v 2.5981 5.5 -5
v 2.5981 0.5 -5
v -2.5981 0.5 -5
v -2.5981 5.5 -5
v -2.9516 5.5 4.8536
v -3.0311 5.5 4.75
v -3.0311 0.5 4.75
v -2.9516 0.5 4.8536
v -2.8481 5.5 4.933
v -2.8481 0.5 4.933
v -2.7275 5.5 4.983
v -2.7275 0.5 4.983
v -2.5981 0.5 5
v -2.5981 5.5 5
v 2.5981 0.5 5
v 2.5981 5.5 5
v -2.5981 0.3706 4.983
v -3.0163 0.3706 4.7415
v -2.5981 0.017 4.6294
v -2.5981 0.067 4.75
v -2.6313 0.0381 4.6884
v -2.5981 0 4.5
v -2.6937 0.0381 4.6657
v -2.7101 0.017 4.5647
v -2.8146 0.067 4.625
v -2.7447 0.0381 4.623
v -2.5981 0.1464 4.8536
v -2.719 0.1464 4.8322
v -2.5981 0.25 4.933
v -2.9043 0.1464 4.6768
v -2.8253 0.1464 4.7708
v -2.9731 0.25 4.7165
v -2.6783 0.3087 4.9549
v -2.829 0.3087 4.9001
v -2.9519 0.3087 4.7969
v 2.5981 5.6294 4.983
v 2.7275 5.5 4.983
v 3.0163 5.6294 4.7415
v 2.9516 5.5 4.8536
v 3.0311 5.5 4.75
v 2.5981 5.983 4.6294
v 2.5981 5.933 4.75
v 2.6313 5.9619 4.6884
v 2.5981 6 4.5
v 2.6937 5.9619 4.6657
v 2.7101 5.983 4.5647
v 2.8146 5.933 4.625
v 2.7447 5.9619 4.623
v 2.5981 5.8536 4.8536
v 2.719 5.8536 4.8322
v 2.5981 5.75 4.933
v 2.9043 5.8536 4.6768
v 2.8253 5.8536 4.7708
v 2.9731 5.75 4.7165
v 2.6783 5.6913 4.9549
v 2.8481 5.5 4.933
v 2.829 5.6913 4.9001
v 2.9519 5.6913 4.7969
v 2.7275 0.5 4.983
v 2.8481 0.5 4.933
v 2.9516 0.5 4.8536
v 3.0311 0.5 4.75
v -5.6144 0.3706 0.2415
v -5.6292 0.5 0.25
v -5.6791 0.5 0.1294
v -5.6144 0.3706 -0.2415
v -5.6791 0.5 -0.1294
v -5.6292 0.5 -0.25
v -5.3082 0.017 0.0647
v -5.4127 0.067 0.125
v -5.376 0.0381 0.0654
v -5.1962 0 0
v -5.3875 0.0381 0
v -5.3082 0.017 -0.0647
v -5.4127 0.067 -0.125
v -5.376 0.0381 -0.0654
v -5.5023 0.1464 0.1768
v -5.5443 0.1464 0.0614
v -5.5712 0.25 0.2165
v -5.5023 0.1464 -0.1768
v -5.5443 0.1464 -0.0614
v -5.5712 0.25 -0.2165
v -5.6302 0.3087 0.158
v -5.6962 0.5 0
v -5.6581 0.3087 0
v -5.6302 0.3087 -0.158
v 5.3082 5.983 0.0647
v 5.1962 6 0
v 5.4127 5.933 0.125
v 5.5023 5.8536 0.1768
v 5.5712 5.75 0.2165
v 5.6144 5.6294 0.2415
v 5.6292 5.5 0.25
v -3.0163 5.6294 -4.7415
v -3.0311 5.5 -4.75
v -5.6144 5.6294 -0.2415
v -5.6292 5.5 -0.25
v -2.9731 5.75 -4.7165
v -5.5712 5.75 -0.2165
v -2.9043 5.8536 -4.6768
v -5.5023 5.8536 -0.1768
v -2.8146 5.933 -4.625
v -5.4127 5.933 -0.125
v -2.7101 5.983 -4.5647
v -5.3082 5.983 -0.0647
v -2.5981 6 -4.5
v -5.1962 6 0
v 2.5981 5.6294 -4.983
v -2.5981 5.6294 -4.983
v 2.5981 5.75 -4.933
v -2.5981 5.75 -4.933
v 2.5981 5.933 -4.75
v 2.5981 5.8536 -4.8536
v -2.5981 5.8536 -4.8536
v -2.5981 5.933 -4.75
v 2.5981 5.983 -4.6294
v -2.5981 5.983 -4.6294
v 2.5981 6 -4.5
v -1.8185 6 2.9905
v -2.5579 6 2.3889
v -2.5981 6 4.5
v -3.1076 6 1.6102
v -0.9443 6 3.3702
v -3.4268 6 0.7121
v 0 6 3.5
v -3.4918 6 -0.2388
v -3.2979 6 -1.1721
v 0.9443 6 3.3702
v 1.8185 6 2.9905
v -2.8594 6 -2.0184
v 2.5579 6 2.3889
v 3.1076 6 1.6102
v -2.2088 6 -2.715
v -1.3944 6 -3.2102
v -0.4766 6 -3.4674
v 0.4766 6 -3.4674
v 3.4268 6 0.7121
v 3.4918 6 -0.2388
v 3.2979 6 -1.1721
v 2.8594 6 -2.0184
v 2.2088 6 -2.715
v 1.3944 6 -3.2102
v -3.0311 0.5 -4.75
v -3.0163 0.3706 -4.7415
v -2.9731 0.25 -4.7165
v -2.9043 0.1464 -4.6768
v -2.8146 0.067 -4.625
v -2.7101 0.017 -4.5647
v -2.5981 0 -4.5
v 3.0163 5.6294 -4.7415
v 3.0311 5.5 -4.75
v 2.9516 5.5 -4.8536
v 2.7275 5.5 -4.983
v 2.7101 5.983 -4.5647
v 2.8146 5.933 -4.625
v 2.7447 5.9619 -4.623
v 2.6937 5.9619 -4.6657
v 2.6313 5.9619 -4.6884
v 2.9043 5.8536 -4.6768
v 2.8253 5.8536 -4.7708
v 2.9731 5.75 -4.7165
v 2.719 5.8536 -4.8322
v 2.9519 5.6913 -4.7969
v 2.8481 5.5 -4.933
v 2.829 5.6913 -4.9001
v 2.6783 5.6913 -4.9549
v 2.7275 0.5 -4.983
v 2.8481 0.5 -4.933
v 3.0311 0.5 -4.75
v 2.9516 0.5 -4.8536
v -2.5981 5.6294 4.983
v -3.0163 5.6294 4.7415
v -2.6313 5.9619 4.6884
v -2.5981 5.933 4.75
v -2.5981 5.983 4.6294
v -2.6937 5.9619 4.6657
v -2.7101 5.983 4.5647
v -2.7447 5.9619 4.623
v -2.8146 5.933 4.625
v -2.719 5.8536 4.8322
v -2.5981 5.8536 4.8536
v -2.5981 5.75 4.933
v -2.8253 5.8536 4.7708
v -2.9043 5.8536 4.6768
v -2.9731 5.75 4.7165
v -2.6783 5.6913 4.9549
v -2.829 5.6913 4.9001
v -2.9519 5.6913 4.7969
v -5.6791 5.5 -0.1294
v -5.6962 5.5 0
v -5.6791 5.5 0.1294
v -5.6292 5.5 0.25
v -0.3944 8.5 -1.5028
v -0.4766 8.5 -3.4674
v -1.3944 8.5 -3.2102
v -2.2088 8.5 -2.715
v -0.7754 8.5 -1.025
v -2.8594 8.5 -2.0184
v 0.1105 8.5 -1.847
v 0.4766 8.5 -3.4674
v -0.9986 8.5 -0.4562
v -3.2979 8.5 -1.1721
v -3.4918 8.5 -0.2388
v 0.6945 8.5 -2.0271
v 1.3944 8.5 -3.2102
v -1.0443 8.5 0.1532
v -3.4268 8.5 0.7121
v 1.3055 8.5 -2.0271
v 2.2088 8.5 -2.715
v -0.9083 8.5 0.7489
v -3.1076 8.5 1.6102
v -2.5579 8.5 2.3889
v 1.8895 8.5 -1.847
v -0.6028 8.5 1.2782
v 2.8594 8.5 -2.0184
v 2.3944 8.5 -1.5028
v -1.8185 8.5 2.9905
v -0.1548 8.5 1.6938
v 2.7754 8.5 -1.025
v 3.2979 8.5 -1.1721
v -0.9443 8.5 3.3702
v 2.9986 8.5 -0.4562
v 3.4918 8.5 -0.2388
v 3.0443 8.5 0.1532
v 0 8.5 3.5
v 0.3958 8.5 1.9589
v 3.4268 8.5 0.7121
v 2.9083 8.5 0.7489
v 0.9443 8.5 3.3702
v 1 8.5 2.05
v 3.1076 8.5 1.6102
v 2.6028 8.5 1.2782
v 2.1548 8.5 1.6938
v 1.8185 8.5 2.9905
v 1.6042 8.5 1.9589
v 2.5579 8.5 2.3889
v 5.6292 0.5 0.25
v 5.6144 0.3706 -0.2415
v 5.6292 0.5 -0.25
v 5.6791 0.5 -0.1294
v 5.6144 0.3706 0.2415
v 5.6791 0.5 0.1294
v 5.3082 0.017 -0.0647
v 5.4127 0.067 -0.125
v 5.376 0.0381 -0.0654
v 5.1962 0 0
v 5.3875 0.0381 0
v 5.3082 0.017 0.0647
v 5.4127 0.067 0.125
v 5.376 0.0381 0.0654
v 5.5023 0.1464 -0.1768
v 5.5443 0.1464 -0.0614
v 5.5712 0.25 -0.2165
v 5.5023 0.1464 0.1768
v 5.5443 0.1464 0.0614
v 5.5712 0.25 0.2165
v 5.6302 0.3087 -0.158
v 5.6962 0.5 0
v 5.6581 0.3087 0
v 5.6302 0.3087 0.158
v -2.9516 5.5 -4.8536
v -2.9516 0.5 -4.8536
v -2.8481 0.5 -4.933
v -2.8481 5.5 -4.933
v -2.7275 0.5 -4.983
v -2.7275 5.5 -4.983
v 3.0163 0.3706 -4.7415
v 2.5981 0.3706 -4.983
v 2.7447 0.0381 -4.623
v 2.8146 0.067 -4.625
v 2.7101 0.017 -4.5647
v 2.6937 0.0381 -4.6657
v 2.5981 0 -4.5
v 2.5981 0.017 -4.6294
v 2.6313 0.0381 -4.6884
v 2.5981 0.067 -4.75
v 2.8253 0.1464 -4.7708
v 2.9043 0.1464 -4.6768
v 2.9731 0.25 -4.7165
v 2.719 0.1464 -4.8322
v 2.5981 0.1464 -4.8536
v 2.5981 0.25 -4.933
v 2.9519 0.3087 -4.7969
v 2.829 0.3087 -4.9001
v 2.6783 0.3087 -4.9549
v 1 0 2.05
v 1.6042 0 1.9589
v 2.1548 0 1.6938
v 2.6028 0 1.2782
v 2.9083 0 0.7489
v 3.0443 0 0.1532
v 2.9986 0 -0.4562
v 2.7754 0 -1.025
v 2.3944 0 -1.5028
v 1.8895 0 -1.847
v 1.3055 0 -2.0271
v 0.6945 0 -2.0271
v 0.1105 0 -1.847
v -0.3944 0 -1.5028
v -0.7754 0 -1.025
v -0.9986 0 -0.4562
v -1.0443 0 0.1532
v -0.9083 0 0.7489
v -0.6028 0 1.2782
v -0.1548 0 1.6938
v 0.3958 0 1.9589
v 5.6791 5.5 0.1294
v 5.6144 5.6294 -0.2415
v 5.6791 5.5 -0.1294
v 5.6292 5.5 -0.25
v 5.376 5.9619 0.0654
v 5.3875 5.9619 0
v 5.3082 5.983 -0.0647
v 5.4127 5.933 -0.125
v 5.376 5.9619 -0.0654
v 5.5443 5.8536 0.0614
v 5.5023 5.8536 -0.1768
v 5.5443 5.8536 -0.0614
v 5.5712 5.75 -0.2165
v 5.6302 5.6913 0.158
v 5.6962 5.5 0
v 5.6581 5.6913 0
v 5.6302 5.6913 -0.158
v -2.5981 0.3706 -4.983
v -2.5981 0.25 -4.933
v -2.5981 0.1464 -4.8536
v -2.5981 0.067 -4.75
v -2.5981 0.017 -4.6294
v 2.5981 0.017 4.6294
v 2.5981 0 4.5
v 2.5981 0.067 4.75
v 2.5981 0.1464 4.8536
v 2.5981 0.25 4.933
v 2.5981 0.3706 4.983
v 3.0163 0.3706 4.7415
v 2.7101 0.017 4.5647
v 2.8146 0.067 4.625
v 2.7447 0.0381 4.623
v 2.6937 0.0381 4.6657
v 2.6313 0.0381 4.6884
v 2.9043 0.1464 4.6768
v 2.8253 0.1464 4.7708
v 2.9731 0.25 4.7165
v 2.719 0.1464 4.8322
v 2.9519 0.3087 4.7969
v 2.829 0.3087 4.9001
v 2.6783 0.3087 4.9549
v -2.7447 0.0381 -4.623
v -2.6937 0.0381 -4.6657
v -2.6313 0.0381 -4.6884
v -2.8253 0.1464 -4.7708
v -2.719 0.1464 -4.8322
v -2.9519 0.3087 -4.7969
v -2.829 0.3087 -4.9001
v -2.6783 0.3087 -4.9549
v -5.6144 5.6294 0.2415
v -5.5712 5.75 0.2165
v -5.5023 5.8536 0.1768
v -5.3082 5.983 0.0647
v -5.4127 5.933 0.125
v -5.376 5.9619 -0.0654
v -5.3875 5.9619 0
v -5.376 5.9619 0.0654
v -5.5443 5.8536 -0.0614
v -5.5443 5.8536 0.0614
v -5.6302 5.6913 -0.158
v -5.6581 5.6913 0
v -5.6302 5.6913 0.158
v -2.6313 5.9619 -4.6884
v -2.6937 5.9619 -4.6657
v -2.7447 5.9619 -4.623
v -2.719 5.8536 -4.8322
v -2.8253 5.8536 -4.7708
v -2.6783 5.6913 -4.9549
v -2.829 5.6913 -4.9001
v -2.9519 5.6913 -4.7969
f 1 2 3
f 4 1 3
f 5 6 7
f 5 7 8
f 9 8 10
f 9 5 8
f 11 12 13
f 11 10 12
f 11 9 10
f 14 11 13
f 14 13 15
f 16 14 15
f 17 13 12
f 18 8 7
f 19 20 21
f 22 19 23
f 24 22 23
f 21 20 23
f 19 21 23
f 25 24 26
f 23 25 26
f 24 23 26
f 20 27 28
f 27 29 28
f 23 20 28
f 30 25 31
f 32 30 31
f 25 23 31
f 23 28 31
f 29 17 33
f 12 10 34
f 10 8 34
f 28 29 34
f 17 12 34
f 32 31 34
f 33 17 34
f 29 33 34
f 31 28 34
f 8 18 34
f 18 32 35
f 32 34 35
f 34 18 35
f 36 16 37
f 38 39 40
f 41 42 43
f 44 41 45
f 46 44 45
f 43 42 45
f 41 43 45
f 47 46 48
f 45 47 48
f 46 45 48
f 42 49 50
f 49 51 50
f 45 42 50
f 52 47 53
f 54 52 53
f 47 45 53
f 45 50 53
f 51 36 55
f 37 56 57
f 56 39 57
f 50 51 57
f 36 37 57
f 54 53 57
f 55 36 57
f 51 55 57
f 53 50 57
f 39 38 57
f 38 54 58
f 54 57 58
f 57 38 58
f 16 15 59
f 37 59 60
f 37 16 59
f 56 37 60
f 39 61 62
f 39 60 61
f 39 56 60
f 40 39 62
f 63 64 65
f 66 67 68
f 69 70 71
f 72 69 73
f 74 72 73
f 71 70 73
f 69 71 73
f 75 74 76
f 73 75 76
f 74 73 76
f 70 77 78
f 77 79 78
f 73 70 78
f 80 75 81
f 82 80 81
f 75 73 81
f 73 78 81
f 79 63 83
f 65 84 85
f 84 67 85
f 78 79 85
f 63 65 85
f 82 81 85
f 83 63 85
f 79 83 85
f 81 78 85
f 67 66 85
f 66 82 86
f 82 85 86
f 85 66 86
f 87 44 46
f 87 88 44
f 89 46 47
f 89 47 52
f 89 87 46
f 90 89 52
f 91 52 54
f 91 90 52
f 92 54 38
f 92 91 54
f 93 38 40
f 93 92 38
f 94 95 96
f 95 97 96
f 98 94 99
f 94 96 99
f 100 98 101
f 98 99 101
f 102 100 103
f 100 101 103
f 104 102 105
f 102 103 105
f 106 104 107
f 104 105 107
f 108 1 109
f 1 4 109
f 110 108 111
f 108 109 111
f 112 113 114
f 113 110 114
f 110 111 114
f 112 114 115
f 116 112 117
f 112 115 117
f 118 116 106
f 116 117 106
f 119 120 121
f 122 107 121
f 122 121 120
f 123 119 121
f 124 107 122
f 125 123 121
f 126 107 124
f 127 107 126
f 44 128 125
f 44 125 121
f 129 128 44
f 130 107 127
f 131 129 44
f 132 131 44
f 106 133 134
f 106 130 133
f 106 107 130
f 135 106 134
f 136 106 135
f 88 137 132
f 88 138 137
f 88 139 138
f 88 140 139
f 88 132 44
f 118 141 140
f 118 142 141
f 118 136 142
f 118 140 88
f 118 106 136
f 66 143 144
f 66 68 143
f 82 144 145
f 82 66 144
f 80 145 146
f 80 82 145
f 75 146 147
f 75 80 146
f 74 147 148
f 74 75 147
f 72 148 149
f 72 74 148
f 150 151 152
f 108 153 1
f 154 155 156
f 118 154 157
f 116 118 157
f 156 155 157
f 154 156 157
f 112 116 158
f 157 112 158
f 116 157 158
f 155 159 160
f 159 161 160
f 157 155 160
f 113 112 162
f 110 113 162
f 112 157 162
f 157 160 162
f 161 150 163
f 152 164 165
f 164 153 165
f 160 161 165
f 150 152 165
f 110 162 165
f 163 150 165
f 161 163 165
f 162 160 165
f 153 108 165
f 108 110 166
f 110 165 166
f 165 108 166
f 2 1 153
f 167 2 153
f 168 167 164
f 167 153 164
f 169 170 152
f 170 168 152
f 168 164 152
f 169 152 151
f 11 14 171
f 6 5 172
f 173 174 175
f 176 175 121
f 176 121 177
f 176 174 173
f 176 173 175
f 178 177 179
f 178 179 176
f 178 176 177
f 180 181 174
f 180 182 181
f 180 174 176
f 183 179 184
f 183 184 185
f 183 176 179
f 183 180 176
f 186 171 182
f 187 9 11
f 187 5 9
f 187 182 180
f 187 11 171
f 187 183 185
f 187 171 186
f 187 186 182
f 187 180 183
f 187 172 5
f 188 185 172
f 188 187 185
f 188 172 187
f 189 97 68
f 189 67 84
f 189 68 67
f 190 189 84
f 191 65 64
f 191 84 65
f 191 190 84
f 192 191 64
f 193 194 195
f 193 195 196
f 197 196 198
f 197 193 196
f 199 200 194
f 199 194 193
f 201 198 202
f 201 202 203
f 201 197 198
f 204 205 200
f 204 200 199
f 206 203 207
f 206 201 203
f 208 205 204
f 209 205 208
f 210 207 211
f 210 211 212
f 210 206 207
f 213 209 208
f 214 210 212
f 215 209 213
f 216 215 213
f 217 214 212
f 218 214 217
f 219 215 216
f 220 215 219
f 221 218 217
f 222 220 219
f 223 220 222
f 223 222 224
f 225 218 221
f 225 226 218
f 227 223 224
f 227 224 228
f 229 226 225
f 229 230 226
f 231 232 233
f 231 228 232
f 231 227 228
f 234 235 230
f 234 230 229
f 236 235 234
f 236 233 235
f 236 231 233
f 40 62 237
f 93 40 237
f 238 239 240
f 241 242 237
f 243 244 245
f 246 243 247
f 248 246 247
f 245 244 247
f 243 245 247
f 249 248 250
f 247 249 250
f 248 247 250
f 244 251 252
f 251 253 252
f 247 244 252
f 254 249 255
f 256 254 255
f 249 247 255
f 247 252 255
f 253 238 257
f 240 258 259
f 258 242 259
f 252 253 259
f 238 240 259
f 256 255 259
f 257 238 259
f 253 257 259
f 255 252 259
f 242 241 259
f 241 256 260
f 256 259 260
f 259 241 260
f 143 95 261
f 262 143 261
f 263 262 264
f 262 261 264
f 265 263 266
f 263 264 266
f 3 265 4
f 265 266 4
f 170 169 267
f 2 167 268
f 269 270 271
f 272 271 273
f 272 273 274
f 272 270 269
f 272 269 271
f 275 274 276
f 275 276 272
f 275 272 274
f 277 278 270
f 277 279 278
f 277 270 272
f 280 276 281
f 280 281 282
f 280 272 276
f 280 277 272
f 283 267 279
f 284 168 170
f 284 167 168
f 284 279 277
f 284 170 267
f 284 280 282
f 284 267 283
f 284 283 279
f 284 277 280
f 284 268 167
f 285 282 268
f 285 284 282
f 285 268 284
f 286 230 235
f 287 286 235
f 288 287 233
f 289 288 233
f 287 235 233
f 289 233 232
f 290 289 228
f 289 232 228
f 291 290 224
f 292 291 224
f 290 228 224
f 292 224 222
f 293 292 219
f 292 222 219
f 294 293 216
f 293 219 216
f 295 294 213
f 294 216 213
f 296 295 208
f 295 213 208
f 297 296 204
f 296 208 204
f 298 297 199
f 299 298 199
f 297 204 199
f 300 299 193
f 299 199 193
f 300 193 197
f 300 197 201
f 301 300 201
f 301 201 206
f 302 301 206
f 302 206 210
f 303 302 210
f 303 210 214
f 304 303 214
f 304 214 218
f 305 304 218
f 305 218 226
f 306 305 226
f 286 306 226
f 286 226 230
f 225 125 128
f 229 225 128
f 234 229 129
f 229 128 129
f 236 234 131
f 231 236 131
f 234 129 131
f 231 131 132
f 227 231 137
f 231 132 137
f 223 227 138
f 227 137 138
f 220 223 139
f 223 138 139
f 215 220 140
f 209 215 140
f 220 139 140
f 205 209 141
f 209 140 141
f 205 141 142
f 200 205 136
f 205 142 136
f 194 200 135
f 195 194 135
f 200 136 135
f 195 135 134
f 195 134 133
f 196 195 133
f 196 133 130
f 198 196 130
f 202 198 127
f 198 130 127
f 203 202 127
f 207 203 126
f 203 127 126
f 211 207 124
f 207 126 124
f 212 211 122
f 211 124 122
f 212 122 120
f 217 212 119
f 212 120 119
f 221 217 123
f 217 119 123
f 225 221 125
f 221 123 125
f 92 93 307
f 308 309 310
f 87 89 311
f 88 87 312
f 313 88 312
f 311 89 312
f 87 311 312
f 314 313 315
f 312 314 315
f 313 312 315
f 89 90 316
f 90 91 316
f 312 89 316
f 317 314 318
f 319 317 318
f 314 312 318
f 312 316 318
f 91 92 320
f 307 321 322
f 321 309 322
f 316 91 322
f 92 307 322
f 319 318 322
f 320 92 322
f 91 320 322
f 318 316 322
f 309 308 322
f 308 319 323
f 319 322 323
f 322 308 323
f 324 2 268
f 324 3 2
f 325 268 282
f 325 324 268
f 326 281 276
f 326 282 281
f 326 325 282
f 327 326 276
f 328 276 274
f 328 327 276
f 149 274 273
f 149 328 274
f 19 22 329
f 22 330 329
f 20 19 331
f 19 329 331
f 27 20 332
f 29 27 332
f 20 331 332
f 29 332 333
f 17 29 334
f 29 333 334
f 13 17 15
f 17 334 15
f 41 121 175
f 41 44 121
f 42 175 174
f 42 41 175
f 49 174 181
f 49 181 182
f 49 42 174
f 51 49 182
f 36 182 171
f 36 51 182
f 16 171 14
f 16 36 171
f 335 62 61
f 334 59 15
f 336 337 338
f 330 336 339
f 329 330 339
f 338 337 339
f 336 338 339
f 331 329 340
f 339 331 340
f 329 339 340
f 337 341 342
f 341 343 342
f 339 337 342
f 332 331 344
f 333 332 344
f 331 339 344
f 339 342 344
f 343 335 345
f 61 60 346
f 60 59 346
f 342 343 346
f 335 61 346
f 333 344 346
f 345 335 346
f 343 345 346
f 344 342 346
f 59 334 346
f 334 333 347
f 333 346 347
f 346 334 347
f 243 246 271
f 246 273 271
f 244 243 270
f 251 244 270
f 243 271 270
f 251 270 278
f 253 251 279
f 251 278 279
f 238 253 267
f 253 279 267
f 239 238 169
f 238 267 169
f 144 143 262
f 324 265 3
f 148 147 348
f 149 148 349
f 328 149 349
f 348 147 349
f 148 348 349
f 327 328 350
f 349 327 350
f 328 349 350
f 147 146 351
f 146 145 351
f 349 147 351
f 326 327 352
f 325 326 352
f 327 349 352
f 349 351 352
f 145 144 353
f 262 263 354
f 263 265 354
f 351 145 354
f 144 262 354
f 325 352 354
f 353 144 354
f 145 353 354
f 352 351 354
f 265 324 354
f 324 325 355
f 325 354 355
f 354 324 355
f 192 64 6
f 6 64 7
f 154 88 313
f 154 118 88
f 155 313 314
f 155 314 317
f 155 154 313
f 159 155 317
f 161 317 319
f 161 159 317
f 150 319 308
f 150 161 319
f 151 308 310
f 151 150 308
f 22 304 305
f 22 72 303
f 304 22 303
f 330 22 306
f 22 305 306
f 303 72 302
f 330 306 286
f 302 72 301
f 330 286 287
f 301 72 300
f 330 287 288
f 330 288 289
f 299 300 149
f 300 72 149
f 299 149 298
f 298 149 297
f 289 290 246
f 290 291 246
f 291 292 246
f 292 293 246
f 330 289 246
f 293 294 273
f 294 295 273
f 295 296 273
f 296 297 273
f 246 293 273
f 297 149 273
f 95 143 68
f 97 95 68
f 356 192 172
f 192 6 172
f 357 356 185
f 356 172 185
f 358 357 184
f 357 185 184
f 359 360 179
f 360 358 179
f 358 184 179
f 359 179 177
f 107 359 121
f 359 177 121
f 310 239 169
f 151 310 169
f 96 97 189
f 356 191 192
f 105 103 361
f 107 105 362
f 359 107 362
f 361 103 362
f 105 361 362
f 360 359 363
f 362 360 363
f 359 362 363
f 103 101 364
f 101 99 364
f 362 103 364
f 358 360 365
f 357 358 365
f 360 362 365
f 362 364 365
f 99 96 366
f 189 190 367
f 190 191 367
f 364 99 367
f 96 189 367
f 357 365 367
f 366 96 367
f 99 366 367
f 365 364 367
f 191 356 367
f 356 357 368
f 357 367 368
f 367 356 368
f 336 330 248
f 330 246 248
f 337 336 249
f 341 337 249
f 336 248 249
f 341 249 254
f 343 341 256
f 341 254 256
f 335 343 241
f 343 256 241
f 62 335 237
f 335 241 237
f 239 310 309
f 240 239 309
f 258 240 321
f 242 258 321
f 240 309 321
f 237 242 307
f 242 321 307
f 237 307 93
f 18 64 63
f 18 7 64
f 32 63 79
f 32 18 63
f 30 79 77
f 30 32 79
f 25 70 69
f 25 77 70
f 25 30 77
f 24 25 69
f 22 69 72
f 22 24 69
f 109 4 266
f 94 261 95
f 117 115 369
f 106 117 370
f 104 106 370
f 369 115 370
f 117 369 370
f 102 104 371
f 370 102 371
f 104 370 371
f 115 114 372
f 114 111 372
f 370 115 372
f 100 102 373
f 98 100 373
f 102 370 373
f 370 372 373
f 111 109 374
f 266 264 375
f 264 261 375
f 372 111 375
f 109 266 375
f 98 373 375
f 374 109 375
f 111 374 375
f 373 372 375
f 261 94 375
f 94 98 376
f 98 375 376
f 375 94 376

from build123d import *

# Parameters (mm, degrees)
BOSS_EXTRUDE1_DEPTH = 6
SKETCH2_R           = 3.5
BOSS_EXTRUDE2_DEPTH = 2.5
SKETCH4_R           = 2.05
CUT_EXTRUDE1_DEPTH  = 12.427306478
FILLET1_R           = 0.5


with BuildPart() as part:
    # Sketch1 → Boss-Extrude1 (new body)
    with BuildSketch(Plane(origin=(0, 0, 0), x_dir=(1, 0, 0), z_dir=(0, 1, 0))):
        Polygon((-2.886751346, 5), (-5.773502692, 0), (-2.886751346, -5), (2.886751346, -5), (5.773502692, 0), (2.886751346, 5), align=None)
    extrude(amount=BOSS_EXTRUDE1_DEPTH)

    # Sketch2 → Boss-Extrude2 (add)
    with BuildSketch(Plane(origin=(0, 6, 0), x_dir=(1, 0, 0), z_dir=(0, 1, 0))):
        with Locations(Location((0, 0, 0), (0, 0, 270))):
            Circle(SKETCH2_R)
    extrude(amount=BOSS_EXTRUDE2_DEPTH)

    # Sketch4 → Cut-Extrude1 (cut, through all)
    with BuildSketch(Plane(origin=(0, 8.5, 0), x_dir=(1, 0, 0), z_dir=(0, 1, 0))):
        with Locations(Location((1, 0, 0), (0, 0, 270))):
            Circle(SKETCH4_R)
    extrude(amount=-CUT_EXTRUDE1_DEPTH, mode=Mode.SUBTRACT)

    # Fillet1
    fillet1_edges = [part.edges().sort_by_distance(p)[0] for p in [
        (-4.330127019, 6, 2.5),
        (2.886751346, 3, -5),
        (5.773502692, 3, 0),
        (2.886751346, 3, 5),
        (-2.886751346, 3, 5),
        (-5.773502692, 3, 0),
        (-2.886751346, 3, -5),
        (0, 6, 5),
        (4.330127019, 6, 2.5),
        (4.330127019, 6, -2.5),
        (0, 6, -5),
        (4.330127019, 0, -2.5),
        (4.330127019, 0, 2.5),
        (0, 0, 5),
        (-4.330127019, 6, -2.5),
        (-4.330127019, 0, 2.5),
        (-4.330127019, 0, -2.5),
        (0, 0, -5),
    ]]
    fillet(fillet1_edges, radius=FILLET1_R)


solid = part.part
